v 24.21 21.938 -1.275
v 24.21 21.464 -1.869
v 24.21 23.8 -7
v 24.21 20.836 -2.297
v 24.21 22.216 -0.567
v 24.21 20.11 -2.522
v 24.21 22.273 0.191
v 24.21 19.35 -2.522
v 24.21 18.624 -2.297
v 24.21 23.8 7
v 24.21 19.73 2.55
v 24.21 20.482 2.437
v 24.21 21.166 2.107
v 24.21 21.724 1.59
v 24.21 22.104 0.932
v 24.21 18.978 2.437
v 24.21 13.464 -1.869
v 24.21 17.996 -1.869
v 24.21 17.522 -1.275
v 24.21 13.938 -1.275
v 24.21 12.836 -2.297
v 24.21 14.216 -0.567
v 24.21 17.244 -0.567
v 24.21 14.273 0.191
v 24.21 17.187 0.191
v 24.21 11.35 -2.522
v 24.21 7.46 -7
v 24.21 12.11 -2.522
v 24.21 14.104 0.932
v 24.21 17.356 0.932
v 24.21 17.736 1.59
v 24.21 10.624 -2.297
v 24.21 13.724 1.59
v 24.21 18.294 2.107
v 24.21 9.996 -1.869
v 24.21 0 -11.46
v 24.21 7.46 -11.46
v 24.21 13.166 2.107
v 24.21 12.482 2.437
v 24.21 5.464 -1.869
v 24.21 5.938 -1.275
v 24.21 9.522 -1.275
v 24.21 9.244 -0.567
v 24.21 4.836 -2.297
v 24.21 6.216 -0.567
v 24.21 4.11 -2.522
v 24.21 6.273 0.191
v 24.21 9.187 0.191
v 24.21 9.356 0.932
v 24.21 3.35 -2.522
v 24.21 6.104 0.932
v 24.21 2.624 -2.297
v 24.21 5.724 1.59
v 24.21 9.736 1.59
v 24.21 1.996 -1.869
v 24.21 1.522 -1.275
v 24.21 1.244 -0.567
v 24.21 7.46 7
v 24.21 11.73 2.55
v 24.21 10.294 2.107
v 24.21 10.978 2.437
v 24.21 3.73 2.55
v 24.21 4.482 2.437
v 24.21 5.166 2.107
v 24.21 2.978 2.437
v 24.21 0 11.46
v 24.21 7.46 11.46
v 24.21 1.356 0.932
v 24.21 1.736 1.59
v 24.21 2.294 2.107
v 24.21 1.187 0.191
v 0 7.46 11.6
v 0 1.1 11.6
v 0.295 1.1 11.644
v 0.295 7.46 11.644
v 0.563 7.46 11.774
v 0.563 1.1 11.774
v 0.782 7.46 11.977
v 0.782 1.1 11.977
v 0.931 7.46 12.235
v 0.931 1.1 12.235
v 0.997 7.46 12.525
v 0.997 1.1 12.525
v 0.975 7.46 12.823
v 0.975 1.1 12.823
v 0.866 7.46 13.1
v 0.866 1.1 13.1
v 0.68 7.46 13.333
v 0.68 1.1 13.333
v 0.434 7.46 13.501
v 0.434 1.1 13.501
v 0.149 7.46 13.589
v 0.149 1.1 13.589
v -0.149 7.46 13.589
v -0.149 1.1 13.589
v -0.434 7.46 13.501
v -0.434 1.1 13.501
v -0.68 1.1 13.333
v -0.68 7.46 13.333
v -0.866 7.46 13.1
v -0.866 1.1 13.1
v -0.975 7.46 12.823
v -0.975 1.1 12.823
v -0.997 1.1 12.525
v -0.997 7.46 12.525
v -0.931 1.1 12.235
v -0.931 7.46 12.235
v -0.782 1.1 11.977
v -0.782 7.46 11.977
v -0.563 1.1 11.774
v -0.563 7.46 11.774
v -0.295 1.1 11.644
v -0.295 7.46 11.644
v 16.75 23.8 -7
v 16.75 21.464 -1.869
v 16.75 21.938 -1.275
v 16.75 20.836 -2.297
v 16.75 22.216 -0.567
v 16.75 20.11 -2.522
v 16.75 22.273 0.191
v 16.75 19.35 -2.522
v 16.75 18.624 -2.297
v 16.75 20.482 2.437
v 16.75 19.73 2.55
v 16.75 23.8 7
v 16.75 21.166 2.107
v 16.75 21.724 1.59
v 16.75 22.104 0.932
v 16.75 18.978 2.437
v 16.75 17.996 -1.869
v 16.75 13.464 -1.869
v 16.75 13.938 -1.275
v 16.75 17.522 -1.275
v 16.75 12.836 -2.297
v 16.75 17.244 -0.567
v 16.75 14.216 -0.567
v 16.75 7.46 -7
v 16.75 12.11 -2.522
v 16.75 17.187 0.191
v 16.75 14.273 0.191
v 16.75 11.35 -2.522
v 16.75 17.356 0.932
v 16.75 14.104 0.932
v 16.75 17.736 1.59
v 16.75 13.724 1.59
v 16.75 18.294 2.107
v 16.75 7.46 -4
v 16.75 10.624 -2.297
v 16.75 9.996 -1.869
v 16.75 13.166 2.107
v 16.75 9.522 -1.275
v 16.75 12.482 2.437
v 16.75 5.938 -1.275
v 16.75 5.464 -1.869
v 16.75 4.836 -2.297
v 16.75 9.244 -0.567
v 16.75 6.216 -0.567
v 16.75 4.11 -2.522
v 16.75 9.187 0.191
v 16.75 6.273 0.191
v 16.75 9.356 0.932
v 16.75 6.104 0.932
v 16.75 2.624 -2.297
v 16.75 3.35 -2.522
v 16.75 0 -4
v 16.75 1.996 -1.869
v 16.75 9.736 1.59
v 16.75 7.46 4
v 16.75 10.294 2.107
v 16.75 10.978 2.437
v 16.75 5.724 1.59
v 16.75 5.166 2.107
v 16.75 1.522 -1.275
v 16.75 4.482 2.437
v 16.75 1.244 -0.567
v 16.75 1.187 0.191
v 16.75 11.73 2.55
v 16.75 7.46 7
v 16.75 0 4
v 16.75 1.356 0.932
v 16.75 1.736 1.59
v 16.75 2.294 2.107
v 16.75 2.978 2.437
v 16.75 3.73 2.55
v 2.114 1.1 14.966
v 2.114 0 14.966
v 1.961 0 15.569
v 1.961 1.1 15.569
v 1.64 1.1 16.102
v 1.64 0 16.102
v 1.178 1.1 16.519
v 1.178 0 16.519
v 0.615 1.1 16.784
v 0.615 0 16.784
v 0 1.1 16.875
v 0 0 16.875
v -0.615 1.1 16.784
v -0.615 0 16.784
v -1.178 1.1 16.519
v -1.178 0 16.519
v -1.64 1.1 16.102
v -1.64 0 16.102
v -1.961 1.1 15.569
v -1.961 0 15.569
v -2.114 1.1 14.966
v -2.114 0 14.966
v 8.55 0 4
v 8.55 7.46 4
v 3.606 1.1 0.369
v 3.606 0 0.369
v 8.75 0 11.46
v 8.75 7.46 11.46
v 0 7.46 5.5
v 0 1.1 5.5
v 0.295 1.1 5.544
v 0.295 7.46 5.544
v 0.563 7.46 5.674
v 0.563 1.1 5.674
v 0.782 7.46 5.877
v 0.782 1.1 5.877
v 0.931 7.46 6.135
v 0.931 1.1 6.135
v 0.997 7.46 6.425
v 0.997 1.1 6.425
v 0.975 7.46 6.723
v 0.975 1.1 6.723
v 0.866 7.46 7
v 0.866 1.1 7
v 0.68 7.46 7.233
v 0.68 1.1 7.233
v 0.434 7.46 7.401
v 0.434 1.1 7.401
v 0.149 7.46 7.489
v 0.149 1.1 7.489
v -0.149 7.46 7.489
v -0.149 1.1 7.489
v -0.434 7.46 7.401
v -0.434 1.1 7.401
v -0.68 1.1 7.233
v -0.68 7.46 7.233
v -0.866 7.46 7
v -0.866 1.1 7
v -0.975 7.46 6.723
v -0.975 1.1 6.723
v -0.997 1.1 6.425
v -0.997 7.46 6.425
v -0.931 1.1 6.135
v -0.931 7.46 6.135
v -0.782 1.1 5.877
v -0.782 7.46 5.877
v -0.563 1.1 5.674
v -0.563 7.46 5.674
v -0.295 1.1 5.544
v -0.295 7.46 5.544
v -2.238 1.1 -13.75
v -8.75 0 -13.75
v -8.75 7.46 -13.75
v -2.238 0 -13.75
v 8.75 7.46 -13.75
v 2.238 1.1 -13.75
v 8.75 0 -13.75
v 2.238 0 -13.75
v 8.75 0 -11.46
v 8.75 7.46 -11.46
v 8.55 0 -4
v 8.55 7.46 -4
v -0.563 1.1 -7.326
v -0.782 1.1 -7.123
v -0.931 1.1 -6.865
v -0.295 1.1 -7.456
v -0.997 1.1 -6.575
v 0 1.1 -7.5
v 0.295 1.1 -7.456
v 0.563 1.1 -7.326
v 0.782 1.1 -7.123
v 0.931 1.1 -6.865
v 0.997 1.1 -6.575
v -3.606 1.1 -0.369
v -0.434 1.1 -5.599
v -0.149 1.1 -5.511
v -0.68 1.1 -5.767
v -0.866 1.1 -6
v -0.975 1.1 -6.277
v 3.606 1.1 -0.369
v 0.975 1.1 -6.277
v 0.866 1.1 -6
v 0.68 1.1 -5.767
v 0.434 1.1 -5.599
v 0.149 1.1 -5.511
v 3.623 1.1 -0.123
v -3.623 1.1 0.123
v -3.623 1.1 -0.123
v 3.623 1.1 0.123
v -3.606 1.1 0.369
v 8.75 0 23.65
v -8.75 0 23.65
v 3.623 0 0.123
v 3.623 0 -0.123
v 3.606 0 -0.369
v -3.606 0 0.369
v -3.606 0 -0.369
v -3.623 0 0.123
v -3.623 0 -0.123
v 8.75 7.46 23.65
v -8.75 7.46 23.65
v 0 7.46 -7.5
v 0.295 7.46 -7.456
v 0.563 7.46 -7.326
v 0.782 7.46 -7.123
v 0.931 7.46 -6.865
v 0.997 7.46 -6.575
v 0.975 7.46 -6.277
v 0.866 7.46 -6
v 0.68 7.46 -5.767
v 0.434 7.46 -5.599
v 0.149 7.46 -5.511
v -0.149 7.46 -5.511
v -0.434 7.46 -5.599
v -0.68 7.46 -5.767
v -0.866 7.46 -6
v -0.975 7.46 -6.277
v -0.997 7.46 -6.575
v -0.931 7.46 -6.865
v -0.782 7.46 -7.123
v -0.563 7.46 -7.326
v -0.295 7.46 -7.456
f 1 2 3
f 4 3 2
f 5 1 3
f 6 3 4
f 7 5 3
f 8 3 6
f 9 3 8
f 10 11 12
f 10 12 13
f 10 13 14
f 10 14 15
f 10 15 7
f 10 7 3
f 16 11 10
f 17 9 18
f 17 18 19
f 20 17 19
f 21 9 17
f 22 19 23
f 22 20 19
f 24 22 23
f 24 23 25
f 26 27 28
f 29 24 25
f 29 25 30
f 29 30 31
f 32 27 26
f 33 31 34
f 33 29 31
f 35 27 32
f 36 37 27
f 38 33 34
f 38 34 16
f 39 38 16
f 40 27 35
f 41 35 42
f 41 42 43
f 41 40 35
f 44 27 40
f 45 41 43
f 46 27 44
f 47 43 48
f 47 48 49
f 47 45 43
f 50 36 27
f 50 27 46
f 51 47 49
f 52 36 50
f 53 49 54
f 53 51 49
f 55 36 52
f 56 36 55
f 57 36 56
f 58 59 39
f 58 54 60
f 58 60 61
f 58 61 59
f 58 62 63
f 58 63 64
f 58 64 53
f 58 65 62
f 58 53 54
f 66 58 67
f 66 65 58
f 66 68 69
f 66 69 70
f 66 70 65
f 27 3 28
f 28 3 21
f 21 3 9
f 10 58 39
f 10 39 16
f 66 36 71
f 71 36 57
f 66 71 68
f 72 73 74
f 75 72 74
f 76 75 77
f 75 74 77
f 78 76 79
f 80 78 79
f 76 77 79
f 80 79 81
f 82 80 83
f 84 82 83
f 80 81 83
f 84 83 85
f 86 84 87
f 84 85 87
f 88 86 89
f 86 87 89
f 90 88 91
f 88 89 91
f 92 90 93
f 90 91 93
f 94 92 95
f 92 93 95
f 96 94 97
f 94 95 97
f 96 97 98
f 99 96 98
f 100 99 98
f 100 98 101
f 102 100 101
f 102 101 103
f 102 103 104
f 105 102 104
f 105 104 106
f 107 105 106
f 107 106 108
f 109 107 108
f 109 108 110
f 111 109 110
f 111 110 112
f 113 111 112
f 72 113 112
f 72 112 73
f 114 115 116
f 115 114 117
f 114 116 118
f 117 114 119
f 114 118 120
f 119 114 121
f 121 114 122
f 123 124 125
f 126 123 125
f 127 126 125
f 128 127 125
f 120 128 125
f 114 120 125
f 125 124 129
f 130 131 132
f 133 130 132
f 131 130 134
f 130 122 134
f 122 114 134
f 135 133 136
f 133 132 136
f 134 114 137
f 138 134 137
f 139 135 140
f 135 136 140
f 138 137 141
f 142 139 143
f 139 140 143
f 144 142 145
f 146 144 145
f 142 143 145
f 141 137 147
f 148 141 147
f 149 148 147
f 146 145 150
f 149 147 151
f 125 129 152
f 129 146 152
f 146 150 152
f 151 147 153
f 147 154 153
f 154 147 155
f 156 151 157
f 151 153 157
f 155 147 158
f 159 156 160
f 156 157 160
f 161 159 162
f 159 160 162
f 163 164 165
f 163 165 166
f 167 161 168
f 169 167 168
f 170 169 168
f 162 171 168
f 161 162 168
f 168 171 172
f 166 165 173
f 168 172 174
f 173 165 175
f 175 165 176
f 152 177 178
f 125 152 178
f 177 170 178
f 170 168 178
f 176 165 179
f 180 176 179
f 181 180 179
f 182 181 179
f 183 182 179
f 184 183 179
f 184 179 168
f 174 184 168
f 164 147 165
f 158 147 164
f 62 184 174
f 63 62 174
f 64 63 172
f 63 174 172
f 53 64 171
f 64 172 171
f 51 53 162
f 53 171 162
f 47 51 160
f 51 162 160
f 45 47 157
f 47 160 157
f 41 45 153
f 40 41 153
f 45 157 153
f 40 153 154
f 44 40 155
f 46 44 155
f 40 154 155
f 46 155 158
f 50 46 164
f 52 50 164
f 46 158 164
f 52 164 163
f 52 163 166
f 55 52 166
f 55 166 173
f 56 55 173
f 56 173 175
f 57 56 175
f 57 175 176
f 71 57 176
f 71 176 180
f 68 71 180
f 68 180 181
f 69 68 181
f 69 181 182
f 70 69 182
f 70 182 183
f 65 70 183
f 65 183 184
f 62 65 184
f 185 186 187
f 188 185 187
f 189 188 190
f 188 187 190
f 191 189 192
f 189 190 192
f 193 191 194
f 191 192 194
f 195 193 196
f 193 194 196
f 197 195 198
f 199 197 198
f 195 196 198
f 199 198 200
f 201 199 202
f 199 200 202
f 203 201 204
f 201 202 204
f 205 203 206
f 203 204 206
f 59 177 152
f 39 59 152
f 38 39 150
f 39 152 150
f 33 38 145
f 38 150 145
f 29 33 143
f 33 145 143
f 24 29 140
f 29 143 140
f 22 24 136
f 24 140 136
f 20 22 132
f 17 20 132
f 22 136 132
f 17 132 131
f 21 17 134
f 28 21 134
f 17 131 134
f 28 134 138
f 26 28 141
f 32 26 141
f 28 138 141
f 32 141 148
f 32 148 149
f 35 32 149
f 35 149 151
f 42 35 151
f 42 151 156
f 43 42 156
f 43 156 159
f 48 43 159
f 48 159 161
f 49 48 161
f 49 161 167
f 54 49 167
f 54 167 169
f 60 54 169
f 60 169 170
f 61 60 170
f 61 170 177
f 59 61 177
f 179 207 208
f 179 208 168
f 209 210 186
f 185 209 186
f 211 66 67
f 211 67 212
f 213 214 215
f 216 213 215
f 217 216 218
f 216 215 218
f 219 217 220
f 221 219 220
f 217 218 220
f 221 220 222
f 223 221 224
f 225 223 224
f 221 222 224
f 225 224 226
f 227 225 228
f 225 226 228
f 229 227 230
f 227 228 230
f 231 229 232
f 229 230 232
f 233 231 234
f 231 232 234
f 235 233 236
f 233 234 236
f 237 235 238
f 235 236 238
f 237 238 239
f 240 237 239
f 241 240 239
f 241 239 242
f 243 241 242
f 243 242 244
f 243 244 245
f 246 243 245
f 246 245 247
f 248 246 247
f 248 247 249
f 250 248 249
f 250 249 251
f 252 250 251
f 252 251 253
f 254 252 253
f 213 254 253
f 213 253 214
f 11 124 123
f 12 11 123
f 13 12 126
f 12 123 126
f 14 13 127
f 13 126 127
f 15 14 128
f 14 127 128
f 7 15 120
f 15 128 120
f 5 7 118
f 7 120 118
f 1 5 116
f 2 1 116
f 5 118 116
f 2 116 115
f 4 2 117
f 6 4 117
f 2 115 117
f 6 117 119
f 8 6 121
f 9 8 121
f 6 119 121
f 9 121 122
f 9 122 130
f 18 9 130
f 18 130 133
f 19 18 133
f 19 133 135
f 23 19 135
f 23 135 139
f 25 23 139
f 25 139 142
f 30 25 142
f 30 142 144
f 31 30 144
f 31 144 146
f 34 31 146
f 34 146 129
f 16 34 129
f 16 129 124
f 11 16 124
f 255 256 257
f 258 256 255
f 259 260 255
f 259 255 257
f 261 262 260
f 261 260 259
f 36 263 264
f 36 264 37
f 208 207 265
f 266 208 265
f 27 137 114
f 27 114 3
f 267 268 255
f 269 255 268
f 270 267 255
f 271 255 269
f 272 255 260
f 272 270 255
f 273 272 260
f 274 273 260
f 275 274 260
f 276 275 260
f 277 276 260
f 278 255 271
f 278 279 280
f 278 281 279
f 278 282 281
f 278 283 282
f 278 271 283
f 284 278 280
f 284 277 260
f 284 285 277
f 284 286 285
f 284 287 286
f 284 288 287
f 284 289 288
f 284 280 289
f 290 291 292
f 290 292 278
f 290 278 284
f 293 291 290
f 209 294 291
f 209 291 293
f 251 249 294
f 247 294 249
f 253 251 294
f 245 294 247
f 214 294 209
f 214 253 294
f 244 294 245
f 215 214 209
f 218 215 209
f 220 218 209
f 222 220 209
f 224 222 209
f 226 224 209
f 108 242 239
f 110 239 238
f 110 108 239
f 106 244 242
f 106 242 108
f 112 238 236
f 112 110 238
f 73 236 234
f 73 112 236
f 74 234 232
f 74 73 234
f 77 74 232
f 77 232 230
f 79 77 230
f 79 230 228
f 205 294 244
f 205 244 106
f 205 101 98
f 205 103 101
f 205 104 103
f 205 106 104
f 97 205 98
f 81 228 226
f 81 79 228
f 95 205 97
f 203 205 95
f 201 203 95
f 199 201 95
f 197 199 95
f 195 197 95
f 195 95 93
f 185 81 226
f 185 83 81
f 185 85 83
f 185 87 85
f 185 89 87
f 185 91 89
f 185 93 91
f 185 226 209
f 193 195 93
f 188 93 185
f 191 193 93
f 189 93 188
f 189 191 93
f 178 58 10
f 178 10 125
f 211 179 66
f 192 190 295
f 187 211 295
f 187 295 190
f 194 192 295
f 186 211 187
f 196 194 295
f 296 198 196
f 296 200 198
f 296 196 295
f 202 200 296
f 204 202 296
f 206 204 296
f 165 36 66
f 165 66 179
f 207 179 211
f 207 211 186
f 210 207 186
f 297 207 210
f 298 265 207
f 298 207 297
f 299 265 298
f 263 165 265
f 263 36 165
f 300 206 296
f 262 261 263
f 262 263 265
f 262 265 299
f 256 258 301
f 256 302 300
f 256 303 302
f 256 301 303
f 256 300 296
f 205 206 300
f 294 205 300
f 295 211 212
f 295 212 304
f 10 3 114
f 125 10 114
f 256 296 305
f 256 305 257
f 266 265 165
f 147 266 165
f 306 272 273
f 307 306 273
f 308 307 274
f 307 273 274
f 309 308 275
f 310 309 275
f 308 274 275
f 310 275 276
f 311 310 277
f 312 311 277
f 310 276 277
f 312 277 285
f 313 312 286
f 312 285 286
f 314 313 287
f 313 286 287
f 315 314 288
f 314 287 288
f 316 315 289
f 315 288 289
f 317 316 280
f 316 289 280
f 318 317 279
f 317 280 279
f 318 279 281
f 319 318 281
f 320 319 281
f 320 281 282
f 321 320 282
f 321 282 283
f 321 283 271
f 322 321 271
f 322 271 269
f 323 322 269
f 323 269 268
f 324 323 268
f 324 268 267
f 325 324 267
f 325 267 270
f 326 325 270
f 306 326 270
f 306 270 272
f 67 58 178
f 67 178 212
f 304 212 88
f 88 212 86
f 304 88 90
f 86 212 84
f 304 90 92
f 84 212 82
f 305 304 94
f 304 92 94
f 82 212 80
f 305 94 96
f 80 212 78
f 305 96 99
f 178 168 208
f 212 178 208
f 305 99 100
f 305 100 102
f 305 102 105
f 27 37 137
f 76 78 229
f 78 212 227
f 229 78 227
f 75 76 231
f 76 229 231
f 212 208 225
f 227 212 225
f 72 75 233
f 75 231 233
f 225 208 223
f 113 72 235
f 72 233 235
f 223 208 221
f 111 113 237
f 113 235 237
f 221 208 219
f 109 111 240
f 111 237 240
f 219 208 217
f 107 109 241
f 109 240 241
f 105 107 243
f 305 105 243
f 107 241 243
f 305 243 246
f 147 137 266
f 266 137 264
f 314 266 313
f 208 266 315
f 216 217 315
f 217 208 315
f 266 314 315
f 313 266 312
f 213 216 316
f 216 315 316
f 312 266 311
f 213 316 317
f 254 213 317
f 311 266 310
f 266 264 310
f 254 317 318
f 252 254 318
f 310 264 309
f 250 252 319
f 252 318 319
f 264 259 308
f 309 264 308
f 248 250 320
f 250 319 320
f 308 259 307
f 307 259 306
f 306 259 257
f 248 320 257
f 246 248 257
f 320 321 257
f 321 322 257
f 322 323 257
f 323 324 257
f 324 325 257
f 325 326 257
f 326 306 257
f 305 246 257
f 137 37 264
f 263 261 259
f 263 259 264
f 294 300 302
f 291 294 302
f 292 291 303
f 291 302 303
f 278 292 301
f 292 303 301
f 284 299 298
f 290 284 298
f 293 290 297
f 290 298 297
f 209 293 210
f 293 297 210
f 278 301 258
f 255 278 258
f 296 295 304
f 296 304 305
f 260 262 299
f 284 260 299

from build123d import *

# Parameters (mm, degrees)
SKETCH1_W           = 8.2
SKETCH1_H           = 8
BOSS_EXTRUDE1_DEPTH = 7.46
BOSS_EXTRUDE2_DEPTH = 16.34
SKETCH4_R           = 2.55
CUT_EXTRUDE1_DEPTH  = 43.142763317
CUT_EXTRUDE2_DEPTH  = 1.1
CUT_EXTRUDE4_REACH  = 42.752
SKETCH6_R           = 1


with BuildPart() as part:
    # Sketch1 → Boss-Extrude1 (new body)
    with BuildSketch(Plane(origin=(0, 0, 0), x_dir=(1, 0, 0), z_dir=(0, 1, 0))):
        Polygon((8.75, 11.46), (24.21, 11.46), (24.21, -11.46), (8.75, -11.46), (8.75, -23.65), (-8.75, -23.65), (-8.75, 13.75), (8.75, 13.75), align=None)
        with Locations((12.65, 0)):
            Rectangle(SKETCH1_W, SKETCH1_H, mode=Mode.SUBTRACT)
    extrude(amount=BOSS_EXTRUDE1_DEPTH)

    # Sketch3 → Boss-Extrude2 (add)
    with BuildSketch(Plane(origin=(0, 7.46, 0), x_dir=(1, 0, 0), z_dir=(0, 1, 0))):
        Polygon((16.75, 7), (24.21, 7), (24.21, -7), (16.75, -7), (16.75, -4), (16.75, 4), align=None)
    extrude(amount=BOSS_EXTRUDE2_DEPTH)

    # Sketch4 → Cut-Extrude1 (cut, through all)
    with BuildSketch(Plane.ZY.offset(-16.75)):
        with Locations((0, 3.73)):
            Circle(SKETCH4_R)
        with Locations((0, 11.73)):
            Circle(SKETCH4_R)
        with Locations((0, 19.73)):
            Circle(SKETCH4_R)
    extrude(amount=-CUT_EXTRUDE1_DEPTH, mode=Mode.SUBTRACT)

    # Sketch5 → Cut-Extrude2 (cut)
    with BuildSketch(Plane.XZ):
        with BuildLine():
            Line((-2.113983221, 14.966101695), (-3.606206671, 0.368644068))
            ThreePointArc((-3.606206671, 0.368644068), (-3.625, 0), (-3.606206671, -0.368644068))
            Line((-3.606206671, -0.368644068), (-2.113983221, -14.966101695))
            ThreePointArc((-2.113983221, -14.966101695), (0, -16.875), (2.113983221, -14.966101695))
            Line((2.113983221, -14.966101695), (3.606206671, -0.368644068))
            ThreePointArc((3.606206671, -0.368644068), (3.625, 0), (3.606206671, 0.368644068))
            Line((3.606206671, 0.368644068), (2.113983221, 14.966101695))
            ThreePointArc((2.113983221, 14.966101695), (0, 16.875), (-2.113983221, 14.966101695))
        make_face()
    extrude(amount=-CUT_EXTRUDE2_DEPTH, mode=Mode.SUBTRACT)

    # Sketch6 → Cut-Extrude4 (cut, up to next)
    with BuildSketch(Plane.XZ.offset(-1.1), mode=Mode.PRIVATE) as cut_extrude4_sk1:
        with Locations(Location((0, 12.6, 0), (0, 0, 270))):
            Circle(SKETCH6_R)
    cut_extrude4_tool1 = extrude(cut_extrude4_sk1.sketch, amount=-CUT_EXTRUDE4_REACH, mode=Mode.PRIVATE) & part.part
    # Sketch6 → Cut-Extrude4 (cut, up to next)
    with BuildSketch(Plane.XZ.offset(-1.1), mode=Mode.PRIVATE) as cut_extrude4_sk2:
        with Locations(Location((0, 6.5, 0), (0, 0, 270))):
            Circle(SKETCH6_R)
    cut_extrude4_tool2 = extrude(cut_extrude4_sk2.sketch, amount=-CUT_EXTRUDE4_REACH, mode=Mode.PRIVATE) & part.part
    # Sketch6 → Cut-Extrude4 (cut, up to next)
    with BuildSketch(Plane.XZ.offset(-1.1), mode=Mode.PRIVATE) as cut_extrude4_sk3:
        with Locations(Location((0, -6.5, 0), (0, 0, 270))):
            Circle(SKETCH6_R)
    cut_extrude4_tool3 = extrude(cut_extrude4_sk3.sketch, amount=-CUT_EXTRUDE4_REACH, mode=Mode.PRIVATE) & part.part
    add(cut_extrude4_tool1.solids().sort_by_distance((0, 1.1, 12.6))[0], mode=Mode.SUBTRACT)
    add(cut_extrude4_tool2.solids().sort_by_distance((0, 1.1, 6.5))[0], mode=Mode.SUBTRACT)
    add(cut_extrude4_tool3.solids().sort_by_distance((0, 1.1, -6.5))[0], mode=Mode.SUBTRACT)


solid = part.part
